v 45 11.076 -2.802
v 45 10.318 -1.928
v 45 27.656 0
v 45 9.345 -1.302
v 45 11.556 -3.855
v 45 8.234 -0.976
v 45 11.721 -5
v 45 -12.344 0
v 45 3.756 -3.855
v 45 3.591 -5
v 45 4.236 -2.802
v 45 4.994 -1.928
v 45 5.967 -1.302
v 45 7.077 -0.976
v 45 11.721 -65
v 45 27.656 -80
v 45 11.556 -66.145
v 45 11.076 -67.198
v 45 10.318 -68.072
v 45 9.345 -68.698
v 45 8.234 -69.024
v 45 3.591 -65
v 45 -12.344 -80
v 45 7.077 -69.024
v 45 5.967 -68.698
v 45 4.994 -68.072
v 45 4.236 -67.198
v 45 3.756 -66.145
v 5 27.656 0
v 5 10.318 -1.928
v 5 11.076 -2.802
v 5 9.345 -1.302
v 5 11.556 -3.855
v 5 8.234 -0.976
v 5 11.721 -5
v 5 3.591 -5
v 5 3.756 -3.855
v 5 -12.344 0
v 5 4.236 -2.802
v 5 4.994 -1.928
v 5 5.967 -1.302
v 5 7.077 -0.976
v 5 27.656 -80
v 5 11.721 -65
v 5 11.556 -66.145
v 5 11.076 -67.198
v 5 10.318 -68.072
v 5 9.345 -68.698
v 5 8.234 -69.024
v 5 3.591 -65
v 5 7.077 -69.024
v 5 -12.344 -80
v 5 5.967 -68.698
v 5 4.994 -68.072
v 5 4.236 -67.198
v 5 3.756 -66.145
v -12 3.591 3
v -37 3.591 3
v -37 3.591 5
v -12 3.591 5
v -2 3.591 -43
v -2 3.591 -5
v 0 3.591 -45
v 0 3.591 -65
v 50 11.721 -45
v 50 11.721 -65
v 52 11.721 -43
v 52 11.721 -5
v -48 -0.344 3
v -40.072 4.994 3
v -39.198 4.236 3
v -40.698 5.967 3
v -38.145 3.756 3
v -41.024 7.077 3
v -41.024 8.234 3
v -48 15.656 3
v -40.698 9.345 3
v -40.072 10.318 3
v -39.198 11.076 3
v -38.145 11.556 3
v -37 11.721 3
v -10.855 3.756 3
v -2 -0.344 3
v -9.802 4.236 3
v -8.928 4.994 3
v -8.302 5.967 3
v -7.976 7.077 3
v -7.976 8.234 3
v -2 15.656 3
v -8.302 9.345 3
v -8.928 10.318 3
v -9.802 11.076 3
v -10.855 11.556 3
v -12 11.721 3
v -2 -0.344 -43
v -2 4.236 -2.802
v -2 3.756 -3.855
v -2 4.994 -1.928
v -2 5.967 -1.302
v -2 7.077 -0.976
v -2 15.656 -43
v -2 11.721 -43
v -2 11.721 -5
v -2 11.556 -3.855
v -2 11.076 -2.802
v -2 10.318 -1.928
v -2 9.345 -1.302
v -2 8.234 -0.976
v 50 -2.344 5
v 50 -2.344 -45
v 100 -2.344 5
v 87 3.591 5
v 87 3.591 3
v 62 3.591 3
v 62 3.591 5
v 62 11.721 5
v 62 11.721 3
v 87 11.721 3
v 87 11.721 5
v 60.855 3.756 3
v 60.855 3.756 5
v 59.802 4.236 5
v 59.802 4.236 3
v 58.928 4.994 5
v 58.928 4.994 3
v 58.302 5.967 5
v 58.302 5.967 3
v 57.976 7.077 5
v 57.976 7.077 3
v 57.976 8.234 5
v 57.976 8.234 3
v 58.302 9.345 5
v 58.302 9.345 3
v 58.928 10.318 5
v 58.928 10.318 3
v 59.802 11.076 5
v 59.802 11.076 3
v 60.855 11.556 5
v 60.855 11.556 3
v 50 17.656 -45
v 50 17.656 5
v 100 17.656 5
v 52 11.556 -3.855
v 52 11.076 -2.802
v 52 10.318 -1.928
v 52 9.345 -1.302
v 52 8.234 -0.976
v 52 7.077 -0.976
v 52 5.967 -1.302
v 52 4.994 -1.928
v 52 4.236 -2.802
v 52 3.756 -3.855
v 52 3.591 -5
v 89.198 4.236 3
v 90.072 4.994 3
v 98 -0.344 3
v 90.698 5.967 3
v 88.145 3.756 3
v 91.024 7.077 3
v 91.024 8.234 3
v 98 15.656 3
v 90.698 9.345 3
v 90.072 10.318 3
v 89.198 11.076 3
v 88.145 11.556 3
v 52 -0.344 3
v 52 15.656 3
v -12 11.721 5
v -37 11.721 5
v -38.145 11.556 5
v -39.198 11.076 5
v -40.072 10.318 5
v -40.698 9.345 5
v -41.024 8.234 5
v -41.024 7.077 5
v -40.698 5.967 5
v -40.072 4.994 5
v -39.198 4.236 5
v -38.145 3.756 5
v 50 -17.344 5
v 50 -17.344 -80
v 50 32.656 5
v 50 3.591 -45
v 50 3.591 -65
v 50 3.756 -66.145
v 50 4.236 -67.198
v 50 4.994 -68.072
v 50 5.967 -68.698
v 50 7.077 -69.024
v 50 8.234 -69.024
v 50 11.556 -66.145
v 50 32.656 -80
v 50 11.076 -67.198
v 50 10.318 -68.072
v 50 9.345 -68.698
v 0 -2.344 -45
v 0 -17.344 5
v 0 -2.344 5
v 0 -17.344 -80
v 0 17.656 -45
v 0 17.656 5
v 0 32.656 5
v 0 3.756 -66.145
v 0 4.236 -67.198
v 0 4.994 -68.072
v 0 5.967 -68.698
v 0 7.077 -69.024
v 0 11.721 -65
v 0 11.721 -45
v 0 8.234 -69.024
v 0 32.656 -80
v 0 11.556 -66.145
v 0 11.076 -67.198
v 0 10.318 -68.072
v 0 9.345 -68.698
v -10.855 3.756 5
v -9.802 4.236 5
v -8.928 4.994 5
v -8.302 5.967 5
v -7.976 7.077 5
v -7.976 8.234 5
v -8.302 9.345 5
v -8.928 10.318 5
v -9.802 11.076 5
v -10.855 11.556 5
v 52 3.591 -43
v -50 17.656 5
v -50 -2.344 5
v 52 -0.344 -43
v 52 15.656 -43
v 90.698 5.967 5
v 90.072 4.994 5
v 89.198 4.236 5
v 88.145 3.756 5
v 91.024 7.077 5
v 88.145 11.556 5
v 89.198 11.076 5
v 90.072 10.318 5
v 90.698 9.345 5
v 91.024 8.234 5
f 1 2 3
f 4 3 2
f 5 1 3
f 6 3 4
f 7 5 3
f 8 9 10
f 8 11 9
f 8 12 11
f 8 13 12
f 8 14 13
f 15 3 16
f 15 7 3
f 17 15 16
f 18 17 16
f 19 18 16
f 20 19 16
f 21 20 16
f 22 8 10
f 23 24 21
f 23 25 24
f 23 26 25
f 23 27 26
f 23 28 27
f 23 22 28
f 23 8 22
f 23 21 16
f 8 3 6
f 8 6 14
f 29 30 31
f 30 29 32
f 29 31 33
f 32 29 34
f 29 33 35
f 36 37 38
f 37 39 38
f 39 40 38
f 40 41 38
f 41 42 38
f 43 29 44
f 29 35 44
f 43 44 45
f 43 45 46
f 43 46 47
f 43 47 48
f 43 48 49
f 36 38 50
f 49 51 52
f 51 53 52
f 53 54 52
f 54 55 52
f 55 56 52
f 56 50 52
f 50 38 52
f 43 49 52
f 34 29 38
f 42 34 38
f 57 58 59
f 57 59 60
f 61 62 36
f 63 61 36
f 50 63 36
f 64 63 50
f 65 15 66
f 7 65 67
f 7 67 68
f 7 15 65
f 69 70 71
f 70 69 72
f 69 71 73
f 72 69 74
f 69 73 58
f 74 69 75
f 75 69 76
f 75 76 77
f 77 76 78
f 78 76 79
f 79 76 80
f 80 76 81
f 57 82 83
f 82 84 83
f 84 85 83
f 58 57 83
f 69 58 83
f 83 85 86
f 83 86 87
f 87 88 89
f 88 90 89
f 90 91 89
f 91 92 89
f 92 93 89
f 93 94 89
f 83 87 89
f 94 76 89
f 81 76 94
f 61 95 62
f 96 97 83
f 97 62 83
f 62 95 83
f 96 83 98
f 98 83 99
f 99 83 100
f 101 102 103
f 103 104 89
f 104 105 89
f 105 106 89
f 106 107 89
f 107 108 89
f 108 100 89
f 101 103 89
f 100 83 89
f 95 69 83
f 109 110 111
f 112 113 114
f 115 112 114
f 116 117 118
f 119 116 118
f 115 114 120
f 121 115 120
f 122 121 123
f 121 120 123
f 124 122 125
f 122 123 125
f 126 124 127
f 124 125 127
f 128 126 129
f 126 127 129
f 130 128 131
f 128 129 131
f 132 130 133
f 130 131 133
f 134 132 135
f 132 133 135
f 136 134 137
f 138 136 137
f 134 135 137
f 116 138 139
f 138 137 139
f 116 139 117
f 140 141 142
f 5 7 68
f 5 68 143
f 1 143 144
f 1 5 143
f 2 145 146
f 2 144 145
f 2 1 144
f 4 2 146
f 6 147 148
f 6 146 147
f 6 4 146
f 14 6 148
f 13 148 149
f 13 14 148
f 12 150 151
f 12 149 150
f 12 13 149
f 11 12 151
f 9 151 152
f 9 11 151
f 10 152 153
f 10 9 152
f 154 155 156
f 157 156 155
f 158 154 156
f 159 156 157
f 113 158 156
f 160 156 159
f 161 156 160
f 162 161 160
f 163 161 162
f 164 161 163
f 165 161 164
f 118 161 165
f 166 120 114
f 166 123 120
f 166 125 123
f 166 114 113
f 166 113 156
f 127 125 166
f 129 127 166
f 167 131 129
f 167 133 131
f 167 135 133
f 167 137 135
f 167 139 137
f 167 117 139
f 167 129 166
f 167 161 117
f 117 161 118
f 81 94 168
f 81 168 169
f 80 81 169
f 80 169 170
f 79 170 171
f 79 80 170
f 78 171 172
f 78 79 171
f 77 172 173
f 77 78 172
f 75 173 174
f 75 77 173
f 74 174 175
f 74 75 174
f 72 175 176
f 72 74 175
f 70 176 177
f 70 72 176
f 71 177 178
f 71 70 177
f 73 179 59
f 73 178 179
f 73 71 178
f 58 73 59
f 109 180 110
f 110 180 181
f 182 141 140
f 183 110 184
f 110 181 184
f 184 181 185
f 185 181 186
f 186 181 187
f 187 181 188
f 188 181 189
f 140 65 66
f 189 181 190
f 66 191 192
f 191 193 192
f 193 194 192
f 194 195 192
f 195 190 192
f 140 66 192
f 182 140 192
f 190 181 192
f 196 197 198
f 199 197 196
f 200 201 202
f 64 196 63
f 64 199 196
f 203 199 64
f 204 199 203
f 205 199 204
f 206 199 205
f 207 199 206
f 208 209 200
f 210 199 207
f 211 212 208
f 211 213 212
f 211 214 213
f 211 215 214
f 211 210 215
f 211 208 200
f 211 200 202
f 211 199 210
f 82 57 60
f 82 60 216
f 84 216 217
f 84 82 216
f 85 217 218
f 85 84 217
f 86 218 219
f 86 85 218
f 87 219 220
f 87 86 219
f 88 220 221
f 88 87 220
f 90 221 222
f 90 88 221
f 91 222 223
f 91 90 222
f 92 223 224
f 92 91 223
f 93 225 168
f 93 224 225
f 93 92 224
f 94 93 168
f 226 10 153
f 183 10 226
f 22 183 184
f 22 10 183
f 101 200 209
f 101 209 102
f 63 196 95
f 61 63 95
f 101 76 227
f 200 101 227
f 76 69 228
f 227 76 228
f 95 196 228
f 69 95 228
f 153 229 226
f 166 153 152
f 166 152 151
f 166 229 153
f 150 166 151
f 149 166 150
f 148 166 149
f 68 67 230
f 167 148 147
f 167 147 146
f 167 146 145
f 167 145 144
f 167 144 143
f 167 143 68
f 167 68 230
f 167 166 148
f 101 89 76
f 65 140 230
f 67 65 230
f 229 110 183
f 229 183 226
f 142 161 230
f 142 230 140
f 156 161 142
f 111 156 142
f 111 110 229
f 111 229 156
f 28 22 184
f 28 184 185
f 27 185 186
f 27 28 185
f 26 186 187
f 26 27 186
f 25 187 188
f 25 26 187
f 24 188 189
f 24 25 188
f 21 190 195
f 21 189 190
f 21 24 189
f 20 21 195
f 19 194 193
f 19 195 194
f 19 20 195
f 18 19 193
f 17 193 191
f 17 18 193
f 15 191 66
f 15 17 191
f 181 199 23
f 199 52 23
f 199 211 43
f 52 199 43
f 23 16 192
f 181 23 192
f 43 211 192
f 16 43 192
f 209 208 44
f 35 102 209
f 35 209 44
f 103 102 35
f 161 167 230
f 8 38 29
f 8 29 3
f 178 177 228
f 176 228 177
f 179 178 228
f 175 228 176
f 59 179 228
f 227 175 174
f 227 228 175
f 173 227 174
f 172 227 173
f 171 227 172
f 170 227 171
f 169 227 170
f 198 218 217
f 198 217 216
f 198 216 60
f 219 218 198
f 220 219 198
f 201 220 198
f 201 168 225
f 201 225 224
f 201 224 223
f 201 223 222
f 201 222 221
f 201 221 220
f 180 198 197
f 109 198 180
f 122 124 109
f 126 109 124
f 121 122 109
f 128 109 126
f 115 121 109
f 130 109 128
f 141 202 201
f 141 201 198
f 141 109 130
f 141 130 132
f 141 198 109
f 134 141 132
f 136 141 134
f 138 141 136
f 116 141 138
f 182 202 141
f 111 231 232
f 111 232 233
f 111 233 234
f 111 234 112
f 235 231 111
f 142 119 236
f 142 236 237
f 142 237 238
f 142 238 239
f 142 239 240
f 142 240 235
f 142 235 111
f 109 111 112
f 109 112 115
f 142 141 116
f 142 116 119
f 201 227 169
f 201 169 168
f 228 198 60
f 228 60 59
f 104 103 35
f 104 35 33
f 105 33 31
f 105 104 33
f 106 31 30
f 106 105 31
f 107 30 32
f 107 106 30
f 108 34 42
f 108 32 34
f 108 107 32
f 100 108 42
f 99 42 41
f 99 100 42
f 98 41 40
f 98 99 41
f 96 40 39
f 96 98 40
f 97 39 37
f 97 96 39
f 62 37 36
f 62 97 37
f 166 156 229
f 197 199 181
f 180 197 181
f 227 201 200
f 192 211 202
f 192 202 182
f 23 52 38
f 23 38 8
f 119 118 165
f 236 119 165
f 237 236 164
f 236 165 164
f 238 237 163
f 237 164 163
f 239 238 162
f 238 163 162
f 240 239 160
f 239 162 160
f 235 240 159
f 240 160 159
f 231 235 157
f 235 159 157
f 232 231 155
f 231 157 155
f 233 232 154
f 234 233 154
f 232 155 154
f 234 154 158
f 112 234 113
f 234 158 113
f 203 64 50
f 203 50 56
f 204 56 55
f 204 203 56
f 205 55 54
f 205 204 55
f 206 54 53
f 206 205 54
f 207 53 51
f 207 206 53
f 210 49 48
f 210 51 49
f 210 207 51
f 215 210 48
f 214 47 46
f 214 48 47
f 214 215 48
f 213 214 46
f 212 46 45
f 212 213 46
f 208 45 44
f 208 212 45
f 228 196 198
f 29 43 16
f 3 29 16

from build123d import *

# Parameters (mm, degrees)
BOSS_EXTRU_1_DEPTH      = 5
BOSS_EXTRU_1_DEPTH_BACK = 80
ESQUISSE1_W             = 50
ESQUISSE1_H             = 50
BOSS_EXTRU_2_DEPTH      = 50
ENL_V_MAT_EXTRU_2_DEPTH = 133.759180474
COQUE1_START            = -12.344146878
COQUE1_OUTLINE_W        = 40
COQUE1_OUTLINE_H        = 80
COQUE1_DEPTH            = 40
ENL_V_MAT_EXTRU_5_DEPTH = 134.997778874
ENL_V_MAT_EXTRU_6_DEPTH = 10
ENL_V_MAT_EXTRU_7_DEPTH = 134.68023318


# Read off the part's stored shape, not the designer's step: Coque1
with BuildPart() as part:
    # Esquisse1 → Boss.-Extru.1 (new, two sides: drawn at the far end of the back side and taken through both)
    with BuildSketch(Plane.XY.offset(-BOSS_EXTRU_1_DEPTH_BACK)):
        with Locations((25, 7.655853122)):
            Rectangle(ESQUISSE1_W, ESQUISSE1_H)
    extrude(amount=BOSS_EXTRU_1_DEPTH + BOSS_EXTRU_1_DEPTH_BACK)

    # Esquisse2 → Boss.-Extru.2 (add)
    with BuildSketch(Plane(origin=(50, 0, 0), x_dir=(0, 0, -1), z_dir=(1, 0, 0))):
        Polygon((-5, 17.655853122), (45, 17.655853122), (45, -2.344146878), (-5, -2.344146878), (-5, 7.655853122), align=None)
    boss_extru_2 = extrude(amount=BOSS_EXTRU_2_DEPTH)

    # Esquisse5 → Enlèv. mat.-Extru.2 (cut, through all)
    with BuildSketch(Plane.XZ.offset(2.344146878)):
        Polygon((50, -45), (100, 5), (100, -45), align=None)
    enl_v_mat_extru_2 = extrude(amount=-ENL_V_MAT_EXTRU_2_DEPTH, mode=Mode.SUBTRACT)

    # Symétrie2: Boss.-Extru.2, Enlèv. mat.-Extru.2 across plane
    add(boss_extru_2.mirror(Plane.ZY.offset(-25)))
    add(enl_v_mat_extru_2.mirror(Plane.ZY.offset(-25)), mode=Mode.SUBTRACT)

    # Coque1 outline → Coque1 (cut)
    with BuildSketch(Plane(origin=(0, 0, 0), x_dir=(1, 0, 0), z_dir=(0, 1, 0)).offset(COQUE1_START)):
        with Locations((25, 40)):
            Rectangle(COQUE1_OUTLINE_W, COQUE1_OUTLINE_H)
    extrude(amount=COQUE1_DEPTH, mode=Mode.SUBTRACT)

    # Esquisse16 → Enlèv. mat.-Extru.5 (cut, through all)
    with BuildSketch(Plane.XY.offset(3)):
        Polygon((52, 15.655853122), (98, 15.655853122), (98, 7.655853122), (98, -0.344146878), (52, -0.344146878), align=None)
    enl_v_mat_extru_5 = extrude(amount=-ENL_V_MAT_EXTRU_5_DEPTH, mode=Mode.SUBTRACT)

    # Symétrie8: Enlèv. mat.-Extru.5 across plane
    add(enl_v_mat_extru_5.mirror(Plane.ZY.offset(-25)), mode=Mode.SUBTRACT)

    # Esquisse17 → Enlèv. mat.-Extru.6 (cut)
    with BuildSketch(Plane(origin=(0, 0, 3), x_dir=(-1, 0, 0), z_dir=(0, 0, -1))):
        with BuildLine():
            Line((12, 11.720853122), (37, 11.720853122))
            ThreePointArc((37, 11.720853122), (41.065, 7.655853122), (37, 3.590853122))
            Line((37, 3.590853122), (12, 3.590853122))
            ThreePointArc((12, 3.590853122), (7.935, 7.655853122), (12, 11.720853122))
        make_face()
    enl_v_mat_extru_6 = extrude(amount=-ENL_V_MAT_EXTRU_6_DEPTH, mode=Mode.SUBTRACT)

    # Symétrie9: Enlèv. mat.-Extru.6 across plane
    add(enl_v_mat_extru_6.mirror(Plane.ZY.offset(-25)), mode=Mode.SUBTRACT)

    # Esquisse18 → Enlèv. mat.-Extru.7 (cut, through all)
    with BuildSketch(Plane.ZY.offset(2)):
        with BuildLine():
            Line((-65, 11.720853122), (-5, 11.720853122))
            ThreePointArc((-5, 11.720853122), (-0.935, 7.655853122), (-5, 3.590853122))
            Line((-5, 3.590853122), (-65, 3.590853122))
            ThreePointArc((-65, 3.590853122), (-69.065, 7.655853122), (-65, 11.720853122))
        make_face()
    extrude(amount=-ENL_V_MAT_EXTRU_7_DEPTH, mode=Mode.SUBTRACT)


solid = part.part
